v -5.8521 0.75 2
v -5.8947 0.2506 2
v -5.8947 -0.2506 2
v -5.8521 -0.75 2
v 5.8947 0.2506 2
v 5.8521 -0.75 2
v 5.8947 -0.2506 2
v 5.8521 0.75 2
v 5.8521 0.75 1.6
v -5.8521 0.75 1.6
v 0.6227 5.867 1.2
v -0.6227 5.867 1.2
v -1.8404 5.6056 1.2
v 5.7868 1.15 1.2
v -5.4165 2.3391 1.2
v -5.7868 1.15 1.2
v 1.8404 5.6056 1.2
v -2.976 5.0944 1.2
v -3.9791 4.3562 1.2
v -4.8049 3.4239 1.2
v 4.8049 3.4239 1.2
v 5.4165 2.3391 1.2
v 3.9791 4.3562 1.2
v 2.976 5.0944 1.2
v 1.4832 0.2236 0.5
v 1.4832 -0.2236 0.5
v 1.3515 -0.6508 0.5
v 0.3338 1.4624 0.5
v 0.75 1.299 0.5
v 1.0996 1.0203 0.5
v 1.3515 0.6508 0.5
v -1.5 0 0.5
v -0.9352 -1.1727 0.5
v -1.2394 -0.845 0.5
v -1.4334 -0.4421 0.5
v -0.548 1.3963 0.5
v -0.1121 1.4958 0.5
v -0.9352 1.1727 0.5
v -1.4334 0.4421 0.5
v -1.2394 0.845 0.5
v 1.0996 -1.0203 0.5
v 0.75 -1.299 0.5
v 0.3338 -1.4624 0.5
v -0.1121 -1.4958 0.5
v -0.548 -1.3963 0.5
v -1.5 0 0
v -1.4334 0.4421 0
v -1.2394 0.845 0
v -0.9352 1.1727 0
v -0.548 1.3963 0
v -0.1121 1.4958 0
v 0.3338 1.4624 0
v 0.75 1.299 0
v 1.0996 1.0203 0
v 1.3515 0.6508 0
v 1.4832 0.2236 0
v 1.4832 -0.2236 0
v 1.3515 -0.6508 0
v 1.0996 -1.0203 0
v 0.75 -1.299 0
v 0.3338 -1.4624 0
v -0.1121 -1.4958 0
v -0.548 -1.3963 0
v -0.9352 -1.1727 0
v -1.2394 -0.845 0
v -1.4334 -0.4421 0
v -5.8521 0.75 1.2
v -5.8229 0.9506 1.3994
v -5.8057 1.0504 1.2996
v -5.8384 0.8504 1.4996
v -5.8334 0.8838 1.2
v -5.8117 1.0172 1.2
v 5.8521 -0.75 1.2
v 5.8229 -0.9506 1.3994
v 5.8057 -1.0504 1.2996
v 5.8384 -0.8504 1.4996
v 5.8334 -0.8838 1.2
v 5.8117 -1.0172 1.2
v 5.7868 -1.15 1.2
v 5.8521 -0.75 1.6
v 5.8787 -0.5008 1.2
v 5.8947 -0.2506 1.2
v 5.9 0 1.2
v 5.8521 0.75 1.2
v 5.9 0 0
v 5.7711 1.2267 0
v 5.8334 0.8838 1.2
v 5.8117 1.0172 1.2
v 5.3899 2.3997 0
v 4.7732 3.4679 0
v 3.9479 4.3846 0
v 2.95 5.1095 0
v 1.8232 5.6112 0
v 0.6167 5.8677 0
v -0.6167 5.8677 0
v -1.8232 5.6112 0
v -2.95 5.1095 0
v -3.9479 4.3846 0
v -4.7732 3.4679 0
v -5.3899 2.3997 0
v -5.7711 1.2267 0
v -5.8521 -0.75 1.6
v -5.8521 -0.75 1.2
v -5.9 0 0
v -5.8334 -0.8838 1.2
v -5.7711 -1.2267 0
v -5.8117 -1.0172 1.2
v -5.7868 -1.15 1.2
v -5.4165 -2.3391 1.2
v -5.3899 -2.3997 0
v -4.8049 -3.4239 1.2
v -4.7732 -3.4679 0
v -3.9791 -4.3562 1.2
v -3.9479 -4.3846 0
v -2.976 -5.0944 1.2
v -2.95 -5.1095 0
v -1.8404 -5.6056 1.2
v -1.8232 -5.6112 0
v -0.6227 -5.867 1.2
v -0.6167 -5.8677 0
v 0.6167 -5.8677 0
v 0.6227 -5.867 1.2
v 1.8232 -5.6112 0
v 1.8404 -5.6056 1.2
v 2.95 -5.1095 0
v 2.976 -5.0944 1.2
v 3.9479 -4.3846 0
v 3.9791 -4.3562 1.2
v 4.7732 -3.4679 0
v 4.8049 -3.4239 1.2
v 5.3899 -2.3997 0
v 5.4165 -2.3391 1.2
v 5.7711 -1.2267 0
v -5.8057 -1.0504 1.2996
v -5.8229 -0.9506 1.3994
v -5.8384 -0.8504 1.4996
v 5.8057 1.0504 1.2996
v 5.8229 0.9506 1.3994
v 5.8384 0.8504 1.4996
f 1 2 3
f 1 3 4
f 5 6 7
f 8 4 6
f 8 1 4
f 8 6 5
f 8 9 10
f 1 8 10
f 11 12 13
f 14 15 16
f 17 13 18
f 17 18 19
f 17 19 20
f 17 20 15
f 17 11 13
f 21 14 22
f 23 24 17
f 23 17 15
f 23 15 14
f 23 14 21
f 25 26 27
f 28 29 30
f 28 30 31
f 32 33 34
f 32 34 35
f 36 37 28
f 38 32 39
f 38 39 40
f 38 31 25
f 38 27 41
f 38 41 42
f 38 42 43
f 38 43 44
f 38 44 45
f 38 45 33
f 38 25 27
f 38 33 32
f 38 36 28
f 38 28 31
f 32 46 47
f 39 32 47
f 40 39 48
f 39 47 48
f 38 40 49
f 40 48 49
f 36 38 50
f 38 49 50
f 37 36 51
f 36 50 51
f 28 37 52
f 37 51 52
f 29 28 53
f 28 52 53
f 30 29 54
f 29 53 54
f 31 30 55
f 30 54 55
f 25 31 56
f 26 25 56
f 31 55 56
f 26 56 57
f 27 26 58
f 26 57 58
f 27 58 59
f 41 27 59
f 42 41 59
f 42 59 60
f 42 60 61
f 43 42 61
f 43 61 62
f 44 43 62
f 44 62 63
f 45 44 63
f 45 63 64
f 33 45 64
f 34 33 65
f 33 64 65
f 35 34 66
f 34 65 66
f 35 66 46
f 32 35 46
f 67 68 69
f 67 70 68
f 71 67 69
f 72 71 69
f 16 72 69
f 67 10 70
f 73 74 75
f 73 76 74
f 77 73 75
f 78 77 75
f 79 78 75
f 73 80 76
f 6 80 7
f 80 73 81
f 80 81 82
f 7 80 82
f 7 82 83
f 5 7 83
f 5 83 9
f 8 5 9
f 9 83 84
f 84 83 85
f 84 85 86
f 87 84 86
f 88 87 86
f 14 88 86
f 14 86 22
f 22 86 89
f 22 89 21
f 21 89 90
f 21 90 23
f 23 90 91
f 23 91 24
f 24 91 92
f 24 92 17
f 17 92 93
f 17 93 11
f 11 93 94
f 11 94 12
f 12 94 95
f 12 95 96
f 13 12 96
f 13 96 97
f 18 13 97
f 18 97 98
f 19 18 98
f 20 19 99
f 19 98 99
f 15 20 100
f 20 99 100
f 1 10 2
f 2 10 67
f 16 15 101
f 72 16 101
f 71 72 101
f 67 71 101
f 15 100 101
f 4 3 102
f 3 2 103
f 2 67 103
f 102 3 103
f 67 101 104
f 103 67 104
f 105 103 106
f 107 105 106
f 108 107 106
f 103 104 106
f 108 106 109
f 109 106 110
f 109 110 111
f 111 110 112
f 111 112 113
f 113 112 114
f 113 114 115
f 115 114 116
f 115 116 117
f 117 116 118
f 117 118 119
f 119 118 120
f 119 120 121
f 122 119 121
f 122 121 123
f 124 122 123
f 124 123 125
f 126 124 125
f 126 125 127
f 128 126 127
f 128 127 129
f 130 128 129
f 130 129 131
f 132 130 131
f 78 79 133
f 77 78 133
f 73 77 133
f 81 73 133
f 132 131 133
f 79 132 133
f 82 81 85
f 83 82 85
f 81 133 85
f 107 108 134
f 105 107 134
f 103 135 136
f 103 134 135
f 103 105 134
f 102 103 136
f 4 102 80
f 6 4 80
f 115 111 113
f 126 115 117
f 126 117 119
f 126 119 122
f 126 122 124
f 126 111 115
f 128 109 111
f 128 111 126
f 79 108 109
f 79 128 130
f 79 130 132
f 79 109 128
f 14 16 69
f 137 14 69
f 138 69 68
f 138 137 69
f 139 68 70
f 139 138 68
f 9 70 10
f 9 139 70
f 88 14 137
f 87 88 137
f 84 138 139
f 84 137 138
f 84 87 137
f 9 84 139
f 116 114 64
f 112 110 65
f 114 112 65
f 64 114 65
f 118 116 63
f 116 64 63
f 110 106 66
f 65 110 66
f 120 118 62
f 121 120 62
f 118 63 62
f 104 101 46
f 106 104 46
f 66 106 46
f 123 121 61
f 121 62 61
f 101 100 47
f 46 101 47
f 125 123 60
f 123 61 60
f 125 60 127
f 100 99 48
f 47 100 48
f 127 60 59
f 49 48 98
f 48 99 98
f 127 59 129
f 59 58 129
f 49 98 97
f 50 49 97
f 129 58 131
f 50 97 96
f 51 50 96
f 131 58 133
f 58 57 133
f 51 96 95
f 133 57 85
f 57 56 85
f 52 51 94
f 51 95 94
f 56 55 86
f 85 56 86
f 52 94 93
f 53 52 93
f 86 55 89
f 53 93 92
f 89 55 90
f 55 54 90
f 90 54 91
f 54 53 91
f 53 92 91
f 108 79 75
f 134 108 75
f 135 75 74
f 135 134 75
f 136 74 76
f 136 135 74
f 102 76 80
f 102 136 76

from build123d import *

# Parameters (mm, degrees)
SKETCH1_R           = 5.9
BOSS_EXTRUDE1_DEPTH = 1.2
BOSS_EXTRUDE2_DEPTH = 0.8
CHAMFER1_SIZE       = 0.4
SKETCH3_R           = 1.5
CUT_EXTRUDE1_DEPTH  = 0.5


with BuildPart() as part:
    # Sketch1 → Boss-Extrude1 (new body)
    with BuildSketch(Plane.XY):
        Circle(SKETCH1_R)
    extrude(amount=BOSS_EXTRUDE1_DEPTH)

    # Sketch2 → Boss-Extrude2 (add)
    with BuildSketch(Plane.XY.offset(1.2)):
        with BuildLine():
            Line((-5.852136362, -0.75), (5.852136362, -0.75))
            ThreePointArc((5.852136362, -0.75), (5.9, 0), (5.852136362, 0.75))
            Line((5.852136362, 0.75), (-5.852136362, 0.75))
            ThreePointArc((-5.852136362, 0.75), (-5.9, 0), (-5.852136362, -0.75))
        make_face()
    extrude(amount=BOSS_EXTRUDE2_DEPTH)

    # Chamfer1
    # the kernel refuses this chamfer: 0.4 mm, written as the material it adds along each edge
    with BuildSketch(Plane(origin=(6.880809557, 0.75, 1.2), x_dir=(0, 0.9996219169112968, -0.02749587661058628), z_dir=(-1, 0, 0))) as chamfer1_piece_1_section:
        Polygon((CHAMFER1_SIZE * 0.999621916911, -CHAMFER1_SIZE * 0.0274958766106), (-CHAMFER1_SIZE * 0.0274958766106, -CHAMFER1_SIZE * 0.999621916911), (0, 0), align=None)
    chamfer1_piece_1 = extrude(amount=13.761619114, mode=Mode.PRIVATE)
    chamfer1_piece_1 = chamfer1_piece_1 & Plane(origin=(0, 0, 1.33206261), x_dir=(1, 0, 0), z_dir=(0, 0, -1)) * Cylinder(5.9, 30, mode=Mode.PRIVATE)
    add(chamfer1_piece_1)
    with BuildSketch(Plane(origin=(-6.880809557, -0.75, 1.2), x_dir=(0, -0.9996219169112968, -0.027495876610586285), z_dir=(1, 0, 0))) as chamfer1_piece_2_section:
        Polygon((CHAMFER1_SIZE * 0.999621916911, -CHAMFER1_SIZE * 0.0274958766106), (-CHAMFER1_SIZE * 0.0274958766106, -CHAMFER1_SIZE * 0.999621916911), (0, 0), align=None)
    chamfer1_piece_2 = extrude(amount=13.761619114, mode=Mode.PRIVATE)
    chamfer1_piece_2 = chamfer1_piece_2 & Plane(origin=(0, 0, 1.33206261), x_dir=(1, 0, 0), z_dir=(0, 0, -1)) * Cylinder(5.9, 30, mode=Mode.PRIVATE)
    add(chamfer1_piece_2)

    # Sketch3 → Cut-Extrude1 (cut)
    with BuildSketch(Plane(origin=(0, 0, 0), x_dir=(-1, 0, 0), z_dir=(0, 0, -1))):
        Circle(SKETCH3_R)
    extrude(amount=-CUT_EXTRUDE1_DEPTH, mode=Mode.SUBTRACT)


solid = part.part
